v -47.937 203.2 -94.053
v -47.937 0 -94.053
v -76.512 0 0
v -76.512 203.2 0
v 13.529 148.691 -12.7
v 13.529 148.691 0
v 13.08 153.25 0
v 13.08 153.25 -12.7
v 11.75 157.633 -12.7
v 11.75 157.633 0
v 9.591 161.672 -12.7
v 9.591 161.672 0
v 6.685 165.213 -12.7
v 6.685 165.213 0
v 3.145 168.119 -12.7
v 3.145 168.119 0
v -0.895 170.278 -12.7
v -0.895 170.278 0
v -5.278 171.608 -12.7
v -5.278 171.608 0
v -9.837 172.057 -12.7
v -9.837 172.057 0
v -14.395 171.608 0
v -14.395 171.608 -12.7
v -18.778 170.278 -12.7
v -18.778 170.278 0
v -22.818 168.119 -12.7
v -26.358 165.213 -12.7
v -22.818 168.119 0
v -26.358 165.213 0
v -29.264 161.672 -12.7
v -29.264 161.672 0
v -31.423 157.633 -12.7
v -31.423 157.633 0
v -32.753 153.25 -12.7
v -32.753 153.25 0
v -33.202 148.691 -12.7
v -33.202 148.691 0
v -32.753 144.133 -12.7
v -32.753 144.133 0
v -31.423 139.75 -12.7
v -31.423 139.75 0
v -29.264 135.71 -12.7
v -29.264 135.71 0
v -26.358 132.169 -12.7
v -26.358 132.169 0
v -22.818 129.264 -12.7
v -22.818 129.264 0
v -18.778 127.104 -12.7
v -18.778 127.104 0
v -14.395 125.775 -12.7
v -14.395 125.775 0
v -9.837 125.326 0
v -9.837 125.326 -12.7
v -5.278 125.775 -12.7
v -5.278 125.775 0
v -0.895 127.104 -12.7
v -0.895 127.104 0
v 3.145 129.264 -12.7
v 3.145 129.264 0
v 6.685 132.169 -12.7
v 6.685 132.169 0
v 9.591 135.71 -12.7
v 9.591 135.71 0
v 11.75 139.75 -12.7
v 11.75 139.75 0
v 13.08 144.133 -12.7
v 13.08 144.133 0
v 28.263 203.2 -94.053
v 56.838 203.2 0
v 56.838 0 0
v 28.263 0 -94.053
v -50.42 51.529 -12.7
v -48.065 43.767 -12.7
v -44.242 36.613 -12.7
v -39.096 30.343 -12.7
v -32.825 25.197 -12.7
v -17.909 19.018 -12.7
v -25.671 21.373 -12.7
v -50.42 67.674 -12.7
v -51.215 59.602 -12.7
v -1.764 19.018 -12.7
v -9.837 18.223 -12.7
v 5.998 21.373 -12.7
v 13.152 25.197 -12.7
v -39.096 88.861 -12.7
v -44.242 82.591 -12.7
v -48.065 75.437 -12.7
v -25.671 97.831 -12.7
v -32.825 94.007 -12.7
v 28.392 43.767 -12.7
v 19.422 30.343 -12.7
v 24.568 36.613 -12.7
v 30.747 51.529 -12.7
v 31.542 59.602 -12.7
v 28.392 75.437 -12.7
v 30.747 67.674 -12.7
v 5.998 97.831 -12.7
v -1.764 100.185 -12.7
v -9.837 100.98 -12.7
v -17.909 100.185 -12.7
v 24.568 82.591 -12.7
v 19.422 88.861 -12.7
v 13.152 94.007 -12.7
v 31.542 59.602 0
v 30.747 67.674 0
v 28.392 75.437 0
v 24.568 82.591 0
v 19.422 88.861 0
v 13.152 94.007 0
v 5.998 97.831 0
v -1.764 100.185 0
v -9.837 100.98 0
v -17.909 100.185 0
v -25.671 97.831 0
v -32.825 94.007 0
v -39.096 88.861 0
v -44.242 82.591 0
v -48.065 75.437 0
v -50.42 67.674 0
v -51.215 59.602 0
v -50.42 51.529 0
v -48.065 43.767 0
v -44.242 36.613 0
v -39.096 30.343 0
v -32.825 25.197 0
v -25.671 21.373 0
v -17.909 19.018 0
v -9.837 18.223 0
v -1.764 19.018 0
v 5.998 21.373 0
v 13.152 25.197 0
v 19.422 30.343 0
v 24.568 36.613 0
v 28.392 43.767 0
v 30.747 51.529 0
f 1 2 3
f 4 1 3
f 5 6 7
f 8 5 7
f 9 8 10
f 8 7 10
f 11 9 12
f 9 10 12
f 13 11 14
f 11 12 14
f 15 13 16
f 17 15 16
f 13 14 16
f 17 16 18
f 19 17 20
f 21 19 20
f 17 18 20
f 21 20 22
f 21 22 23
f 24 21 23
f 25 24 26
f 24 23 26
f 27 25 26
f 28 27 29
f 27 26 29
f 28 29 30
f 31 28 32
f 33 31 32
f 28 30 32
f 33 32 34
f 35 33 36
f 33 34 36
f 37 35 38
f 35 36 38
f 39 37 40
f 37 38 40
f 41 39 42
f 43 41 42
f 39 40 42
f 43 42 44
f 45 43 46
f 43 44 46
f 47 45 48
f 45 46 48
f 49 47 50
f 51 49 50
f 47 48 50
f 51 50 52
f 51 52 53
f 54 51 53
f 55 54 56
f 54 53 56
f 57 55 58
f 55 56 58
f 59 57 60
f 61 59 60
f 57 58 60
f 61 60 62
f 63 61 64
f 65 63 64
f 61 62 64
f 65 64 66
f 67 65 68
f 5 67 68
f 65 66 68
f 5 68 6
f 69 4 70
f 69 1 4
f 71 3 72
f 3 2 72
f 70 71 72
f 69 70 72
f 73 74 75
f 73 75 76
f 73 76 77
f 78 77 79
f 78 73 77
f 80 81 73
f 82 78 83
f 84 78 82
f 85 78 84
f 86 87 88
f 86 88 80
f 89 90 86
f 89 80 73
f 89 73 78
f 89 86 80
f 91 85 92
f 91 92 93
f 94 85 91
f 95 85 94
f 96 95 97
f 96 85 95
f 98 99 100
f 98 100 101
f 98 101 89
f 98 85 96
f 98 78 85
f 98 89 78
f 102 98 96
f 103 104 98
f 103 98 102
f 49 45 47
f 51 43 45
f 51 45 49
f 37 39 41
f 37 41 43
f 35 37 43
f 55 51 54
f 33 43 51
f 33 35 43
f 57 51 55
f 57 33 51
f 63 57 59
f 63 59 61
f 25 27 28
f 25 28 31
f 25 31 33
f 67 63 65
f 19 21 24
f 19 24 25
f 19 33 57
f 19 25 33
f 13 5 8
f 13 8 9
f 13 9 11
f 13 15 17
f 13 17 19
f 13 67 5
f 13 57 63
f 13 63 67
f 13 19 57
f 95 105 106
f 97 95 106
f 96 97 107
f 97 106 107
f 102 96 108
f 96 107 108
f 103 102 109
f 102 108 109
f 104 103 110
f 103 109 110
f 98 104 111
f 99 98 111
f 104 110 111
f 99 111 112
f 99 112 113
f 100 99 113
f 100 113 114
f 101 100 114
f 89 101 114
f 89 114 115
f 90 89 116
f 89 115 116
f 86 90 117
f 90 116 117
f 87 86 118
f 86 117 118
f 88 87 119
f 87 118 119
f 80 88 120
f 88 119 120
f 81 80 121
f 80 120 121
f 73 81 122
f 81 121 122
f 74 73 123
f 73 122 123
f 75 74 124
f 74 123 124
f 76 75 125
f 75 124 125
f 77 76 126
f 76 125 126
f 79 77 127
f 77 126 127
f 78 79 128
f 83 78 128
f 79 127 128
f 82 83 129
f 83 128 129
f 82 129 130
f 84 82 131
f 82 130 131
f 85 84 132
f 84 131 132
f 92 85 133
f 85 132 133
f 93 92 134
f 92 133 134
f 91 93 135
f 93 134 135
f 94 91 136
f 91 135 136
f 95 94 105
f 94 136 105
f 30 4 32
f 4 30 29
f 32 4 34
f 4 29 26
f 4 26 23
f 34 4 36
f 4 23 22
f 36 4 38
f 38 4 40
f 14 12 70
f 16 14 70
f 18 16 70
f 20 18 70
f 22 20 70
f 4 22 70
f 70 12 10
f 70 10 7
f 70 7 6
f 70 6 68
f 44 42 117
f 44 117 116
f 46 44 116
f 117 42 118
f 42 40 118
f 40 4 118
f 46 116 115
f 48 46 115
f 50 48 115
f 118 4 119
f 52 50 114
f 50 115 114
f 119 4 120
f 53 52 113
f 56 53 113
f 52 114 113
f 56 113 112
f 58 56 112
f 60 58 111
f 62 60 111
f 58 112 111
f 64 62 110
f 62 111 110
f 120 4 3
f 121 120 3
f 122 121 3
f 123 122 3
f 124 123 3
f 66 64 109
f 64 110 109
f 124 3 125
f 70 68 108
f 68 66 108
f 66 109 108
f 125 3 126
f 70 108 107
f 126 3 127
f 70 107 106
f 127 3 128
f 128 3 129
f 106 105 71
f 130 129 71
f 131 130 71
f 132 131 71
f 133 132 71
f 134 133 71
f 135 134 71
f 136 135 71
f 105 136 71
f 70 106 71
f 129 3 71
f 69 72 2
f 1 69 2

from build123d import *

# Parameters (mm, degrees)
BOSS_EXTRUDE1_DEPTH = 203.2
SKETCH2_R           = 23.365349899
SKETCH2_R_2         = 41.378531947
CUT_EXTRUDE1_DEPTH  = 12.7


with BuildPart() as part:
    # Sketch1 → Boss-Extrude1 (new body)
    with BuildSketch(Plane(origin=(0, 0, 0), x_dir=(1, 0, 0), z_dir=(0, 1, 0))):
        Polygon((-76.511565421, 0), (56.838434579, 0), (28.263434579, 94.053387857), (-47.936565421, 94.053387857), align=None)
    extrude(amount=BOSS_EXTRUDE1_DEPTH)

    # Sketch2 → Cut-Extrude1 (cut)
    with BuildSketch(Plane.XY):
        with Locations((-9.836565421, 148.691225426)):
            Circle(SKETCH2_R)
        with Locations((-9.836565421, 59.601825969)):
            Circle(SKETCH2_R_2)
    extrude(amount=-CUT_EXTRUDE1_DEPTH, mode=Mode.SUBTRACT)


solid = part.part
